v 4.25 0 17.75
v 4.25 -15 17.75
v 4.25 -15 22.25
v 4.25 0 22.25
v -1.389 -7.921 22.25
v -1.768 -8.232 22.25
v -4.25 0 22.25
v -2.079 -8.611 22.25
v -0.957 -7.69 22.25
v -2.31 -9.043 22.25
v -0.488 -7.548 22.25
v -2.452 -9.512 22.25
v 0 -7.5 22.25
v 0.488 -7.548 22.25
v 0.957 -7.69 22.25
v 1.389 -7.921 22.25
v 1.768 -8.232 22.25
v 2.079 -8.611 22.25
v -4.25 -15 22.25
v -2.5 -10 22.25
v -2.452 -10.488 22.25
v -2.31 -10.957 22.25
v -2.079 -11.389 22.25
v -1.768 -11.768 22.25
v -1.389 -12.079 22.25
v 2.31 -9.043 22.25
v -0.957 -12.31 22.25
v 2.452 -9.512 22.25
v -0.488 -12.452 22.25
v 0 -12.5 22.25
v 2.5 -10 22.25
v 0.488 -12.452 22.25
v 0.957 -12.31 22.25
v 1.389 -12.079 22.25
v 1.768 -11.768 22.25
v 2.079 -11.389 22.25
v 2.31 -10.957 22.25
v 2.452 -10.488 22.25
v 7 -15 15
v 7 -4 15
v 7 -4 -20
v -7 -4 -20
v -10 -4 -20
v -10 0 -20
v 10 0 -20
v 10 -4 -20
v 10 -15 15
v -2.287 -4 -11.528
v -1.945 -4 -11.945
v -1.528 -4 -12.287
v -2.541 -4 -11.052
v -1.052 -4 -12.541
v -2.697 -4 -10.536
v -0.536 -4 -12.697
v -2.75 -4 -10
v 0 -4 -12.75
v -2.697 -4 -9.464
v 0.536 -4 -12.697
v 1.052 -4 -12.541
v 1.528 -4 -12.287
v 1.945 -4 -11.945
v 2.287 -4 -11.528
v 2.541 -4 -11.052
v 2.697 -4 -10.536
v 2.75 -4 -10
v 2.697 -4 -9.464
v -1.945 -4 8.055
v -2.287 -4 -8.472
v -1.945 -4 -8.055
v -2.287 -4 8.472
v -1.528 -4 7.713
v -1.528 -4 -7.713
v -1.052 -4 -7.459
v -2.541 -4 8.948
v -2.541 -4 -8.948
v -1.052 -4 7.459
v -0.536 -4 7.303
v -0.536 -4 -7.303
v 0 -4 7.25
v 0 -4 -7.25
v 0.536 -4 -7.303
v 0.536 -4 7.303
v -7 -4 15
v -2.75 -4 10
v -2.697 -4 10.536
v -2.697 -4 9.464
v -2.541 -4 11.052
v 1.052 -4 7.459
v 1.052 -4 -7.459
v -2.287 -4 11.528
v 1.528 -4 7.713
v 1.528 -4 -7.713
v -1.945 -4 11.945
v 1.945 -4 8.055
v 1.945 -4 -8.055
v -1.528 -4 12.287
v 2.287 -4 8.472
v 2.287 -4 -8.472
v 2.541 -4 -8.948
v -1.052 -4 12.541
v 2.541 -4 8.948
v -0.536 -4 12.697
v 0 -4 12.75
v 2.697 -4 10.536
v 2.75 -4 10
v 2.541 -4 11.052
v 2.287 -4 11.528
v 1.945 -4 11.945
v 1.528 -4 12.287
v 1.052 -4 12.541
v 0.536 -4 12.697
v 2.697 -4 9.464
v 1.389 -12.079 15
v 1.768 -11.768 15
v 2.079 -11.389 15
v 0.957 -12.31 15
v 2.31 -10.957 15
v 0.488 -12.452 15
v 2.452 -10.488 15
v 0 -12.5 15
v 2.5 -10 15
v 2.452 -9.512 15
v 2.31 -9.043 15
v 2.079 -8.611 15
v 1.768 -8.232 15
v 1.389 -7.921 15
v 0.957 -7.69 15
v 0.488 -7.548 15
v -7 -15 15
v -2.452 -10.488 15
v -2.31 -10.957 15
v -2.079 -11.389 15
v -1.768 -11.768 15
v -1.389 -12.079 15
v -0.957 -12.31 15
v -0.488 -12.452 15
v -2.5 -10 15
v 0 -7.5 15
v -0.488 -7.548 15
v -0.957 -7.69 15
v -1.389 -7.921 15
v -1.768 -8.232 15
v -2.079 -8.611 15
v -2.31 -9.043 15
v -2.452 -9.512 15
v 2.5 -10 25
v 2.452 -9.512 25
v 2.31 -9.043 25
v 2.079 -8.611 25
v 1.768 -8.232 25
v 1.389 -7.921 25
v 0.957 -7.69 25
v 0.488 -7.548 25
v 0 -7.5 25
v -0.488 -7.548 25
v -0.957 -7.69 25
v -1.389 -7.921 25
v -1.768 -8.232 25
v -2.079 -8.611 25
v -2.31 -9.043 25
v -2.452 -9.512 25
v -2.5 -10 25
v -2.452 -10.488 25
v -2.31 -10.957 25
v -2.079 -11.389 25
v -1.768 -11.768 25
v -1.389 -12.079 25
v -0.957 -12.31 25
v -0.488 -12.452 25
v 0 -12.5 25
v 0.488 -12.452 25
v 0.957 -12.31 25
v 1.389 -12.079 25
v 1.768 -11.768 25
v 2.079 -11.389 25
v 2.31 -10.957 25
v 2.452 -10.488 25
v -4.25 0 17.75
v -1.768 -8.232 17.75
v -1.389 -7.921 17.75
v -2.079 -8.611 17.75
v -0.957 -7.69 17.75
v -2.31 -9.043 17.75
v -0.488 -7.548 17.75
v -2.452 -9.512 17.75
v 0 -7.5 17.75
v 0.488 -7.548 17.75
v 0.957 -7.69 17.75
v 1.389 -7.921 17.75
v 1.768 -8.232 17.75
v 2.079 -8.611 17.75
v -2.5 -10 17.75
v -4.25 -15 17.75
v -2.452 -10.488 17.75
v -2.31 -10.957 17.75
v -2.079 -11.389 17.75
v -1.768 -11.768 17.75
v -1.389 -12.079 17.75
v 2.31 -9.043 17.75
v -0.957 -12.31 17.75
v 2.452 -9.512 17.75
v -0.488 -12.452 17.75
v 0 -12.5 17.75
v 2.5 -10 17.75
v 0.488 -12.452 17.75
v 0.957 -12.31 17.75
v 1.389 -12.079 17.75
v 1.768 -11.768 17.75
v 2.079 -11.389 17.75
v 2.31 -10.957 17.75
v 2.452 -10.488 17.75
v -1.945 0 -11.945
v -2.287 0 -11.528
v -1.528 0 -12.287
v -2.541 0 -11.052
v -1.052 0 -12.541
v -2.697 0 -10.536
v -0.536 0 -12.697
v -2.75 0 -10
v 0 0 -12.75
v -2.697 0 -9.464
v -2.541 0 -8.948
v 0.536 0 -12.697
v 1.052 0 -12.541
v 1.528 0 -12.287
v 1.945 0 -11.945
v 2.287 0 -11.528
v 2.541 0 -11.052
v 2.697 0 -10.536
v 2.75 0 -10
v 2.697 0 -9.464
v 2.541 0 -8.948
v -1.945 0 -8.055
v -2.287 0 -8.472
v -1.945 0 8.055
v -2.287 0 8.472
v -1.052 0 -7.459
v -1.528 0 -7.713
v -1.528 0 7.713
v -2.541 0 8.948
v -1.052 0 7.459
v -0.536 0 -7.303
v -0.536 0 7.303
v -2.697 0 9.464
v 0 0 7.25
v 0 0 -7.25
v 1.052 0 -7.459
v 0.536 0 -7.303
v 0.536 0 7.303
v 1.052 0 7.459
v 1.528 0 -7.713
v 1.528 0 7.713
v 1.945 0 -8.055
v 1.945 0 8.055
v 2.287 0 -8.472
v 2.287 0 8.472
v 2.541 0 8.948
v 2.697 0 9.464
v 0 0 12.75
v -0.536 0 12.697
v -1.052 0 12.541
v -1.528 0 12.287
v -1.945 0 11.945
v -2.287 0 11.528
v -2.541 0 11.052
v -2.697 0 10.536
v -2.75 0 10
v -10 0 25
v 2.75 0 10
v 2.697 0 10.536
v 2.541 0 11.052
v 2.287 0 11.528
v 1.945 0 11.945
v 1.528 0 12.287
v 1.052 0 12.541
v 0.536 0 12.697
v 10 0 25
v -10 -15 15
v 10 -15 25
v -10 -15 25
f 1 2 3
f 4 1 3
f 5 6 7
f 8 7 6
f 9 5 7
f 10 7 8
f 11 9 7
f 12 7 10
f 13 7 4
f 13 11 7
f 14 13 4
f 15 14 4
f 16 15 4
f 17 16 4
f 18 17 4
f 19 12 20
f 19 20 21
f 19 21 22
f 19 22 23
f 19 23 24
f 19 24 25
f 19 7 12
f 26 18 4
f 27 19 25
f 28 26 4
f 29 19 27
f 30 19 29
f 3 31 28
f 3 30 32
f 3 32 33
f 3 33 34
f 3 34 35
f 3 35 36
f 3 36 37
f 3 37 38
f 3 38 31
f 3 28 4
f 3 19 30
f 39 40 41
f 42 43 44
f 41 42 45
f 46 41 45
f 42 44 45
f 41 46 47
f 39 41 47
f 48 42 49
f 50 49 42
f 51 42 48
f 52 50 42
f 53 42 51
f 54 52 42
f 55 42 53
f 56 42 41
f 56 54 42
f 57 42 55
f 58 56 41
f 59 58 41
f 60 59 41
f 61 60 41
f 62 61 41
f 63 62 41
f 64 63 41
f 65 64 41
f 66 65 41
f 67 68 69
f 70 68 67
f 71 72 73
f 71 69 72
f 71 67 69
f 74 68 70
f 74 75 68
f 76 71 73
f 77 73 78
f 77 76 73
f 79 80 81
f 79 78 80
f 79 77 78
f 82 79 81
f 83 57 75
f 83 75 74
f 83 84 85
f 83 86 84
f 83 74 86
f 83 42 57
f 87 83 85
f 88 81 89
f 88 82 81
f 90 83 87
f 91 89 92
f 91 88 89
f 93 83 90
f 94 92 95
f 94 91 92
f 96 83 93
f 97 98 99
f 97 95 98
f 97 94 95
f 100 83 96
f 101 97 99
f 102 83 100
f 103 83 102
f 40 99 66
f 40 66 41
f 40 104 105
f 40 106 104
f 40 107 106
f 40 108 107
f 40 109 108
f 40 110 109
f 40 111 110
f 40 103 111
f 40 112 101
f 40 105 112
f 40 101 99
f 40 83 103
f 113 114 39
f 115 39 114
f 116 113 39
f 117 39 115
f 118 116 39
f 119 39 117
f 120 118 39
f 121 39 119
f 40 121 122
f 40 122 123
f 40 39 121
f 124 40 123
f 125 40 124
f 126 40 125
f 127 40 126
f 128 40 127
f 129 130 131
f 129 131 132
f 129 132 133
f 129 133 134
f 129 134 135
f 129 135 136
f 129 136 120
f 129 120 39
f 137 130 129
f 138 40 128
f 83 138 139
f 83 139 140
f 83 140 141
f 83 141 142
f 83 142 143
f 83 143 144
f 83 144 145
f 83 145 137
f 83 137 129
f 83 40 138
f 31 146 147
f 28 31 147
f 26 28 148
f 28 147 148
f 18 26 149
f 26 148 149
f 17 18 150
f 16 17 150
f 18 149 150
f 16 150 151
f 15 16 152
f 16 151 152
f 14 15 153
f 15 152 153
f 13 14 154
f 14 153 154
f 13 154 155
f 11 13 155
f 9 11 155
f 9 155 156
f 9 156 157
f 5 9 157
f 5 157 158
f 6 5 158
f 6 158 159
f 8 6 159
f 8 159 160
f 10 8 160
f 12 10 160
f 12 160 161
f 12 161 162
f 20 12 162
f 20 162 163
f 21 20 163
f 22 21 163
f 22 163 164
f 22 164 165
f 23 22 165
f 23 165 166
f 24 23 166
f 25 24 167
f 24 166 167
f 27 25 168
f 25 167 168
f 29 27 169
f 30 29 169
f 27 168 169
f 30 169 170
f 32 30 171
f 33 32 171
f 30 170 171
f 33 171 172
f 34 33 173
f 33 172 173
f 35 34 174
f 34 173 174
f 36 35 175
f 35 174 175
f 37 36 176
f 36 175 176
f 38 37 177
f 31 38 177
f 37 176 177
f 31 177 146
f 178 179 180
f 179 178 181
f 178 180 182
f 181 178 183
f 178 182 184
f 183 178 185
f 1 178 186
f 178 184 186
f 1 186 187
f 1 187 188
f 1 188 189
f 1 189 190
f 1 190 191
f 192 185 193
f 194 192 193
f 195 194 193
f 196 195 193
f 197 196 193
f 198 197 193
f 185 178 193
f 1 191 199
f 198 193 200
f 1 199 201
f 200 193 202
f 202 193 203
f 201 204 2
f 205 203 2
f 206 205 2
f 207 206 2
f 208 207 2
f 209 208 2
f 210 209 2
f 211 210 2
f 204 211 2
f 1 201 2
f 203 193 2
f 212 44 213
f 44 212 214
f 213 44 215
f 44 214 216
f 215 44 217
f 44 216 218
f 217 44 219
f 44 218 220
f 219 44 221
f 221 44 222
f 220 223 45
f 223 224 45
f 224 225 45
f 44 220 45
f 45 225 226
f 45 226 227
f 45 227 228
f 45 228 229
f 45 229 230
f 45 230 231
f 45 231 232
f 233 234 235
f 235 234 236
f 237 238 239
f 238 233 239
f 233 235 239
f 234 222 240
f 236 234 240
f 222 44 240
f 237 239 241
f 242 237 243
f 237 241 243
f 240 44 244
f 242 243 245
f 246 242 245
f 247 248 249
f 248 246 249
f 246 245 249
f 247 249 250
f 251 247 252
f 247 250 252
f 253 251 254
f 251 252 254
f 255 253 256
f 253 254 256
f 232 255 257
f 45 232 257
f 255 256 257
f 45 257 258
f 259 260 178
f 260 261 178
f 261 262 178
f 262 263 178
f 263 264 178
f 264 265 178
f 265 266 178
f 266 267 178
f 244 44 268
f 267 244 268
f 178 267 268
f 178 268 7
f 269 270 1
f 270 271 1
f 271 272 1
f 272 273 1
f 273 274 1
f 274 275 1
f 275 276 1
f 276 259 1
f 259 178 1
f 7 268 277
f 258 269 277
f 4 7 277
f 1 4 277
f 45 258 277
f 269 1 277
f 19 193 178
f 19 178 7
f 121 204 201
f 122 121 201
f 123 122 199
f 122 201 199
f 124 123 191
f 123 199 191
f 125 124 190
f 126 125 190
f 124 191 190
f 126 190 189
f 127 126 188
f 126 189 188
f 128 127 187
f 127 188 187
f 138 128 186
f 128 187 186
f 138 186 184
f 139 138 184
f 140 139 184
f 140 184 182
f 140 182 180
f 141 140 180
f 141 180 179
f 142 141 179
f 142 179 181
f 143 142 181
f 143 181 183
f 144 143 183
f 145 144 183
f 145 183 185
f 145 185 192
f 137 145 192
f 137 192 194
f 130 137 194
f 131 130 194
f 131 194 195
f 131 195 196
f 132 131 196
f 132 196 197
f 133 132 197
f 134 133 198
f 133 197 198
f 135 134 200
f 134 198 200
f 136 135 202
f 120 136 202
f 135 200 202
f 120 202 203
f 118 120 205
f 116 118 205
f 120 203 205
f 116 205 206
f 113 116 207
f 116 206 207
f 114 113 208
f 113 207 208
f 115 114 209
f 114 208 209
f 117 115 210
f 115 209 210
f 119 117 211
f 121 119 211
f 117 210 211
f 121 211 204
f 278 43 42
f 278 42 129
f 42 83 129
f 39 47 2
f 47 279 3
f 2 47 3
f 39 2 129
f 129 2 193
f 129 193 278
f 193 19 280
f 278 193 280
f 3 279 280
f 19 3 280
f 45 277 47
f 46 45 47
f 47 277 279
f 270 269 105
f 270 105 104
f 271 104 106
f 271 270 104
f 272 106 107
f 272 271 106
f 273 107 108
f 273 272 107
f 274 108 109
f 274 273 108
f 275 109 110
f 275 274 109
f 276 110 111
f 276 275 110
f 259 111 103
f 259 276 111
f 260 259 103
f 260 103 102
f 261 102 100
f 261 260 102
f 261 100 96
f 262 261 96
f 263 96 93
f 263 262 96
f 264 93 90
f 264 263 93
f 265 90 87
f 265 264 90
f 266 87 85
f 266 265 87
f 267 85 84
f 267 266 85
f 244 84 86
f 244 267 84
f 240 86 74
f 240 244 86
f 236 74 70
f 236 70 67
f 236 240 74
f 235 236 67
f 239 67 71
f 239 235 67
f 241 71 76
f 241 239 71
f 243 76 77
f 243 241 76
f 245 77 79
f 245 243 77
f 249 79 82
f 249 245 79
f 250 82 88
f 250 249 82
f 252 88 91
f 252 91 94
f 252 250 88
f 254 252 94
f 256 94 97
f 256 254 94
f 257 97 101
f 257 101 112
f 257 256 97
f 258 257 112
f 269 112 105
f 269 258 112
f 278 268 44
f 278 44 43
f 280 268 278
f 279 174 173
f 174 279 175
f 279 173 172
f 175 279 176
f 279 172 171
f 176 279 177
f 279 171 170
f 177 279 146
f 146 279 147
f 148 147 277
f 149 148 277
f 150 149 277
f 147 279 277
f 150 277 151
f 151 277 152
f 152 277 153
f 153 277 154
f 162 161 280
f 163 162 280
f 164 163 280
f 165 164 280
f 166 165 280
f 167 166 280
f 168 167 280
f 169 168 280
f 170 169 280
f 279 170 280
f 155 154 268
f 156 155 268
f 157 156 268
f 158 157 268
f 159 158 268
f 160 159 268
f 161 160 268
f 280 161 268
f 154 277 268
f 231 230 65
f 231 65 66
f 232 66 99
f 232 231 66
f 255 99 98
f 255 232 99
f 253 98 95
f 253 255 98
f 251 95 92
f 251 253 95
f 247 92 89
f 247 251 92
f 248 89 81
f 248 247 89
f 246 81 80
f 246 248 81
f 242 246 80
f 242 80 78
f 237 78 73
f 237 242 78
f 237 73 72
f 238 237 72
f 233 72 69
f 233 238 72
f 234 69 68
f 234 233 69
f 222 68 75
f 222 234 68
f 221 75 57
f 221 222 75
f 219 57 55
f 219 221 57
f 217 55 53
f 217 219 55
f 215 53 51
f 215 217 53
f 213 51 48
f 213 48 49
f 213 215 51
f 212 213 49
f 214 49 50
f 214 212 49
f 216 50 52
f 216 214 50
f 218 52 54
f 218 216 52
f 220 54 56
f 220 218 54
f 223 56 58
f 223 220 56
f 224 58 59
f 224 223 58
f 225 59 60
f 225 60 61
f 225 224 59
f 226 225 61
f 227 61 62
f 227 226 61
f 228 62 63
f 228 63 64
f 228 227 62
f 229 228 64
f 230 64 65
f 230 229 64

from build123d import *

# Parameters (mm, degrees)
F0_W     = 20
F0_H     = 40
F0_R     = 2.75
F1_DEPTH = 4
F2_W     = 20
F2_H     = 10
F3_DEPTH = 15
F4_W     = 8.5
F4_H     = 4.5
F5_DEPTH = 30
F6_R     = 2.5
F7_DEPTH = 20
F9_DEPTH = 3


# Not quite as in the source:
# - a pattern or mirror of a feature is missing from the dataset's text; its kind, count and spacing are read off the source's solid


with BuildPart() as f1:
    # F0 (on Front) → F1 (new body)
    with BuildSketch(Plane.XZ):
        Rectangle(F0_W, F0_H)
        with Locations((0, -10)):
            Circle(F0_R, mode=Mode.SUBTRACT)
        with Locations((0, 10)):
            Circle(F0_R, mode=Mode.SUBTRACT)
    extrude(amount=F1_DEPTH)

    # F2 (on face) → F3 (join)
    with BuildSketch(Plane(origin=(0, 0, 0), x_dir=(-1, 0, 0), z_dir=(0, 1, 0))):
        with Locations((0, 20)):
            Rectangle(F2_W, F2_H)
    extrude(amount=-F3_DEPTH)

    # F4 (on face) → F5 (cut)
    with BuildSketch(Plane.XZ.offset(15)):
        with Locations((0, 20)):
            Rectangle(F4_W, F4_H)
    extrude(amount=-F5_DEPTH, mode=Mode.SUBTRACT)

    # F6 (on face) → F7 (cut)
    with BuildSketch(Plane.XY.offset(25)):
        with Locations((0, -10)):
            Circle(F6_R)
    extrude(amount=-F7_DEPTH, mode=Mode.SUBTRACT)

    # F8 (on face) → F9 (join)
    with BuildSketch(Plane(origin=(-10, 0, 0), x_dir=(0, -1, 0), z_dir=(-1, 0, 0))):
        Polygon((4, -20), (15, 15), (4, 15), align=None)
    f9 = extrude(amount=-F9_DEPTH)

    # F9_copies: F9 across plane
    add(f9.mirror(Plane(origin=(0, 0, 0), x_dir=(0, 0, 1), z_dir=(1, 0, 0))))


solid = f1.part
